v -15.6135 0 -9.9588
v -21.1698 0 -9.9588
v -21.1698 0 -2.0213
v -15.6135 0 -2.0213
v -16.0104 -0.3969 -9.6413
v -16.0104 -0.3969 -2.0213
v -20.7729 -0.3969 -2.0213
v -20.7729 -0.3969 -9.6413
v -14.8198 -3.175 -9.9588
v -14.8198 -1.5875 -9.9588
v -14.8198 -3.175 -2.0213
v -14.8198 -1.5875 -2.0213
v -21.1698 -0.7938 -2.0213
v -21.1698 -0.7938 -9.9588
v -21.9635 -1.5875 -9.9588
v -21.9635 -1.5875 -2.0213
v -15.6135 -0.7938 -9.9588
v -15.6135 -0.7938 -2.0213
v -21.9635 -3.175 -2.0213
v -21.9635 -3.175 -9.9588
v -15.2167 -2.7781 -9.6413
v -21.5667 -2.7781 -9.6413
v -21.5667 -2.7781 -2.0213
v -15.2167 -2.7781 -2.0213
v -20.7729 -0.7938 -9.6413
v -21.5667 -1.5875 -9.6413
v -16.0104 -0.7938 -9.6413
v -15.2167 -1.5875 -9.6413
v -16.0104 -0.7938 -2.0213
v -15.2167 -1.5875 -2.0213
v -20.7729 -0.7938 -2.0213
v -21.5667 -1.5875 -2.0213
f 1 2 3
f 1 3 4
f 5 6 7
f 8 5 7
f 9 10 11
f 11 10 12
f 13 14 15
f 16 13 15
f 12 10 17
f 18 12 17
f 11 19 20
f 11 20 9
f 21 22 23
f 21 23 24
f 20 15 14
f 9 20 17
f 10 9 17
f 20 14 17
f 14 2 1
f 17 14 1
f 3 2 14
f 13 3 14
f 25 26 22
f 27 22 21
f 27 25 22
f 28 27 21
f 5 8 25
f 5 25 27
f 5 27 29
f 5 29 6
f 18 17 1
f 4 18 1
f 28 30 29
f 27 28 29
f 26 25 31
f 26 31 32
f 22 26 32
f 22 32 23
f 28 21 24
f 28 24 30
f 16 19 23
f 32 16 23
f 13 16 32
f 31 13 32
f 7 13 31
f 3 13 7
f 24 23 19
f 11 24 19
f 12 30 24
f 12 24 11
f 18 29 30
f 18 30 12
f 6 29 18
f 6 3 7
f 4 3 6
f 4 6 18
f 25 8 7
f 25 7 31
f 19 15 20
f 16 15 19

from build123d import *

# Parameters (mm, degrees)
F0_W     = 7.14375
F0_H     = 7.9375
F1_DEPTH = 3.175
F3_DEPTH = 7.9385
F5_DEPTH = 7.62


with BuildPart() as f1:
    # F0 (on Front) → F1 (new body)
    with BuildSketch(Plane.XZ):
        with Locations((-18.391654, -5.990053)):
            Rectangle(F0_W, F0_H)
    extrude(amount=F1_DEPTH)

    # F2 (on face) → F3 (cut, through all)
    with BuildSketch(Plane(origin=(0, 0, -9.958803), x_dir=(1, 0, 0), z_dir=(0, 0, -1))):
        Polygon((-21.963529, 0), (-21.169779, 0), (-21.169779, 0.79375), (-21.963529, 1.5875), align=None)
        Polygon((-14.819779, 0), (-14.819779, 1.5875), (-15.613529, 0.79375), (-15.613529, 0), align=None)
    extrude(amount=-F3_DEPTH, mode=Mode.SUBTRACT)

    # F4 (on face) → F5 (cut)
    with BuildSketch(Plane.XY.offset(-2.021303)):
        Polygon((-21.566654, -2.778125), (-15.216654, -2.778125), (-15.216654, -1.5875), (-16.010404, -0.79375), (-16.010404, -0.396875), (-20.772904, -0.396875), (-20.772904, -0.79375), (-21.566654, -1.5875), align=None)
    extrude(amount=-F5_DEPTH, mode=Mode.SUBTRACT)


solid = f1.part
